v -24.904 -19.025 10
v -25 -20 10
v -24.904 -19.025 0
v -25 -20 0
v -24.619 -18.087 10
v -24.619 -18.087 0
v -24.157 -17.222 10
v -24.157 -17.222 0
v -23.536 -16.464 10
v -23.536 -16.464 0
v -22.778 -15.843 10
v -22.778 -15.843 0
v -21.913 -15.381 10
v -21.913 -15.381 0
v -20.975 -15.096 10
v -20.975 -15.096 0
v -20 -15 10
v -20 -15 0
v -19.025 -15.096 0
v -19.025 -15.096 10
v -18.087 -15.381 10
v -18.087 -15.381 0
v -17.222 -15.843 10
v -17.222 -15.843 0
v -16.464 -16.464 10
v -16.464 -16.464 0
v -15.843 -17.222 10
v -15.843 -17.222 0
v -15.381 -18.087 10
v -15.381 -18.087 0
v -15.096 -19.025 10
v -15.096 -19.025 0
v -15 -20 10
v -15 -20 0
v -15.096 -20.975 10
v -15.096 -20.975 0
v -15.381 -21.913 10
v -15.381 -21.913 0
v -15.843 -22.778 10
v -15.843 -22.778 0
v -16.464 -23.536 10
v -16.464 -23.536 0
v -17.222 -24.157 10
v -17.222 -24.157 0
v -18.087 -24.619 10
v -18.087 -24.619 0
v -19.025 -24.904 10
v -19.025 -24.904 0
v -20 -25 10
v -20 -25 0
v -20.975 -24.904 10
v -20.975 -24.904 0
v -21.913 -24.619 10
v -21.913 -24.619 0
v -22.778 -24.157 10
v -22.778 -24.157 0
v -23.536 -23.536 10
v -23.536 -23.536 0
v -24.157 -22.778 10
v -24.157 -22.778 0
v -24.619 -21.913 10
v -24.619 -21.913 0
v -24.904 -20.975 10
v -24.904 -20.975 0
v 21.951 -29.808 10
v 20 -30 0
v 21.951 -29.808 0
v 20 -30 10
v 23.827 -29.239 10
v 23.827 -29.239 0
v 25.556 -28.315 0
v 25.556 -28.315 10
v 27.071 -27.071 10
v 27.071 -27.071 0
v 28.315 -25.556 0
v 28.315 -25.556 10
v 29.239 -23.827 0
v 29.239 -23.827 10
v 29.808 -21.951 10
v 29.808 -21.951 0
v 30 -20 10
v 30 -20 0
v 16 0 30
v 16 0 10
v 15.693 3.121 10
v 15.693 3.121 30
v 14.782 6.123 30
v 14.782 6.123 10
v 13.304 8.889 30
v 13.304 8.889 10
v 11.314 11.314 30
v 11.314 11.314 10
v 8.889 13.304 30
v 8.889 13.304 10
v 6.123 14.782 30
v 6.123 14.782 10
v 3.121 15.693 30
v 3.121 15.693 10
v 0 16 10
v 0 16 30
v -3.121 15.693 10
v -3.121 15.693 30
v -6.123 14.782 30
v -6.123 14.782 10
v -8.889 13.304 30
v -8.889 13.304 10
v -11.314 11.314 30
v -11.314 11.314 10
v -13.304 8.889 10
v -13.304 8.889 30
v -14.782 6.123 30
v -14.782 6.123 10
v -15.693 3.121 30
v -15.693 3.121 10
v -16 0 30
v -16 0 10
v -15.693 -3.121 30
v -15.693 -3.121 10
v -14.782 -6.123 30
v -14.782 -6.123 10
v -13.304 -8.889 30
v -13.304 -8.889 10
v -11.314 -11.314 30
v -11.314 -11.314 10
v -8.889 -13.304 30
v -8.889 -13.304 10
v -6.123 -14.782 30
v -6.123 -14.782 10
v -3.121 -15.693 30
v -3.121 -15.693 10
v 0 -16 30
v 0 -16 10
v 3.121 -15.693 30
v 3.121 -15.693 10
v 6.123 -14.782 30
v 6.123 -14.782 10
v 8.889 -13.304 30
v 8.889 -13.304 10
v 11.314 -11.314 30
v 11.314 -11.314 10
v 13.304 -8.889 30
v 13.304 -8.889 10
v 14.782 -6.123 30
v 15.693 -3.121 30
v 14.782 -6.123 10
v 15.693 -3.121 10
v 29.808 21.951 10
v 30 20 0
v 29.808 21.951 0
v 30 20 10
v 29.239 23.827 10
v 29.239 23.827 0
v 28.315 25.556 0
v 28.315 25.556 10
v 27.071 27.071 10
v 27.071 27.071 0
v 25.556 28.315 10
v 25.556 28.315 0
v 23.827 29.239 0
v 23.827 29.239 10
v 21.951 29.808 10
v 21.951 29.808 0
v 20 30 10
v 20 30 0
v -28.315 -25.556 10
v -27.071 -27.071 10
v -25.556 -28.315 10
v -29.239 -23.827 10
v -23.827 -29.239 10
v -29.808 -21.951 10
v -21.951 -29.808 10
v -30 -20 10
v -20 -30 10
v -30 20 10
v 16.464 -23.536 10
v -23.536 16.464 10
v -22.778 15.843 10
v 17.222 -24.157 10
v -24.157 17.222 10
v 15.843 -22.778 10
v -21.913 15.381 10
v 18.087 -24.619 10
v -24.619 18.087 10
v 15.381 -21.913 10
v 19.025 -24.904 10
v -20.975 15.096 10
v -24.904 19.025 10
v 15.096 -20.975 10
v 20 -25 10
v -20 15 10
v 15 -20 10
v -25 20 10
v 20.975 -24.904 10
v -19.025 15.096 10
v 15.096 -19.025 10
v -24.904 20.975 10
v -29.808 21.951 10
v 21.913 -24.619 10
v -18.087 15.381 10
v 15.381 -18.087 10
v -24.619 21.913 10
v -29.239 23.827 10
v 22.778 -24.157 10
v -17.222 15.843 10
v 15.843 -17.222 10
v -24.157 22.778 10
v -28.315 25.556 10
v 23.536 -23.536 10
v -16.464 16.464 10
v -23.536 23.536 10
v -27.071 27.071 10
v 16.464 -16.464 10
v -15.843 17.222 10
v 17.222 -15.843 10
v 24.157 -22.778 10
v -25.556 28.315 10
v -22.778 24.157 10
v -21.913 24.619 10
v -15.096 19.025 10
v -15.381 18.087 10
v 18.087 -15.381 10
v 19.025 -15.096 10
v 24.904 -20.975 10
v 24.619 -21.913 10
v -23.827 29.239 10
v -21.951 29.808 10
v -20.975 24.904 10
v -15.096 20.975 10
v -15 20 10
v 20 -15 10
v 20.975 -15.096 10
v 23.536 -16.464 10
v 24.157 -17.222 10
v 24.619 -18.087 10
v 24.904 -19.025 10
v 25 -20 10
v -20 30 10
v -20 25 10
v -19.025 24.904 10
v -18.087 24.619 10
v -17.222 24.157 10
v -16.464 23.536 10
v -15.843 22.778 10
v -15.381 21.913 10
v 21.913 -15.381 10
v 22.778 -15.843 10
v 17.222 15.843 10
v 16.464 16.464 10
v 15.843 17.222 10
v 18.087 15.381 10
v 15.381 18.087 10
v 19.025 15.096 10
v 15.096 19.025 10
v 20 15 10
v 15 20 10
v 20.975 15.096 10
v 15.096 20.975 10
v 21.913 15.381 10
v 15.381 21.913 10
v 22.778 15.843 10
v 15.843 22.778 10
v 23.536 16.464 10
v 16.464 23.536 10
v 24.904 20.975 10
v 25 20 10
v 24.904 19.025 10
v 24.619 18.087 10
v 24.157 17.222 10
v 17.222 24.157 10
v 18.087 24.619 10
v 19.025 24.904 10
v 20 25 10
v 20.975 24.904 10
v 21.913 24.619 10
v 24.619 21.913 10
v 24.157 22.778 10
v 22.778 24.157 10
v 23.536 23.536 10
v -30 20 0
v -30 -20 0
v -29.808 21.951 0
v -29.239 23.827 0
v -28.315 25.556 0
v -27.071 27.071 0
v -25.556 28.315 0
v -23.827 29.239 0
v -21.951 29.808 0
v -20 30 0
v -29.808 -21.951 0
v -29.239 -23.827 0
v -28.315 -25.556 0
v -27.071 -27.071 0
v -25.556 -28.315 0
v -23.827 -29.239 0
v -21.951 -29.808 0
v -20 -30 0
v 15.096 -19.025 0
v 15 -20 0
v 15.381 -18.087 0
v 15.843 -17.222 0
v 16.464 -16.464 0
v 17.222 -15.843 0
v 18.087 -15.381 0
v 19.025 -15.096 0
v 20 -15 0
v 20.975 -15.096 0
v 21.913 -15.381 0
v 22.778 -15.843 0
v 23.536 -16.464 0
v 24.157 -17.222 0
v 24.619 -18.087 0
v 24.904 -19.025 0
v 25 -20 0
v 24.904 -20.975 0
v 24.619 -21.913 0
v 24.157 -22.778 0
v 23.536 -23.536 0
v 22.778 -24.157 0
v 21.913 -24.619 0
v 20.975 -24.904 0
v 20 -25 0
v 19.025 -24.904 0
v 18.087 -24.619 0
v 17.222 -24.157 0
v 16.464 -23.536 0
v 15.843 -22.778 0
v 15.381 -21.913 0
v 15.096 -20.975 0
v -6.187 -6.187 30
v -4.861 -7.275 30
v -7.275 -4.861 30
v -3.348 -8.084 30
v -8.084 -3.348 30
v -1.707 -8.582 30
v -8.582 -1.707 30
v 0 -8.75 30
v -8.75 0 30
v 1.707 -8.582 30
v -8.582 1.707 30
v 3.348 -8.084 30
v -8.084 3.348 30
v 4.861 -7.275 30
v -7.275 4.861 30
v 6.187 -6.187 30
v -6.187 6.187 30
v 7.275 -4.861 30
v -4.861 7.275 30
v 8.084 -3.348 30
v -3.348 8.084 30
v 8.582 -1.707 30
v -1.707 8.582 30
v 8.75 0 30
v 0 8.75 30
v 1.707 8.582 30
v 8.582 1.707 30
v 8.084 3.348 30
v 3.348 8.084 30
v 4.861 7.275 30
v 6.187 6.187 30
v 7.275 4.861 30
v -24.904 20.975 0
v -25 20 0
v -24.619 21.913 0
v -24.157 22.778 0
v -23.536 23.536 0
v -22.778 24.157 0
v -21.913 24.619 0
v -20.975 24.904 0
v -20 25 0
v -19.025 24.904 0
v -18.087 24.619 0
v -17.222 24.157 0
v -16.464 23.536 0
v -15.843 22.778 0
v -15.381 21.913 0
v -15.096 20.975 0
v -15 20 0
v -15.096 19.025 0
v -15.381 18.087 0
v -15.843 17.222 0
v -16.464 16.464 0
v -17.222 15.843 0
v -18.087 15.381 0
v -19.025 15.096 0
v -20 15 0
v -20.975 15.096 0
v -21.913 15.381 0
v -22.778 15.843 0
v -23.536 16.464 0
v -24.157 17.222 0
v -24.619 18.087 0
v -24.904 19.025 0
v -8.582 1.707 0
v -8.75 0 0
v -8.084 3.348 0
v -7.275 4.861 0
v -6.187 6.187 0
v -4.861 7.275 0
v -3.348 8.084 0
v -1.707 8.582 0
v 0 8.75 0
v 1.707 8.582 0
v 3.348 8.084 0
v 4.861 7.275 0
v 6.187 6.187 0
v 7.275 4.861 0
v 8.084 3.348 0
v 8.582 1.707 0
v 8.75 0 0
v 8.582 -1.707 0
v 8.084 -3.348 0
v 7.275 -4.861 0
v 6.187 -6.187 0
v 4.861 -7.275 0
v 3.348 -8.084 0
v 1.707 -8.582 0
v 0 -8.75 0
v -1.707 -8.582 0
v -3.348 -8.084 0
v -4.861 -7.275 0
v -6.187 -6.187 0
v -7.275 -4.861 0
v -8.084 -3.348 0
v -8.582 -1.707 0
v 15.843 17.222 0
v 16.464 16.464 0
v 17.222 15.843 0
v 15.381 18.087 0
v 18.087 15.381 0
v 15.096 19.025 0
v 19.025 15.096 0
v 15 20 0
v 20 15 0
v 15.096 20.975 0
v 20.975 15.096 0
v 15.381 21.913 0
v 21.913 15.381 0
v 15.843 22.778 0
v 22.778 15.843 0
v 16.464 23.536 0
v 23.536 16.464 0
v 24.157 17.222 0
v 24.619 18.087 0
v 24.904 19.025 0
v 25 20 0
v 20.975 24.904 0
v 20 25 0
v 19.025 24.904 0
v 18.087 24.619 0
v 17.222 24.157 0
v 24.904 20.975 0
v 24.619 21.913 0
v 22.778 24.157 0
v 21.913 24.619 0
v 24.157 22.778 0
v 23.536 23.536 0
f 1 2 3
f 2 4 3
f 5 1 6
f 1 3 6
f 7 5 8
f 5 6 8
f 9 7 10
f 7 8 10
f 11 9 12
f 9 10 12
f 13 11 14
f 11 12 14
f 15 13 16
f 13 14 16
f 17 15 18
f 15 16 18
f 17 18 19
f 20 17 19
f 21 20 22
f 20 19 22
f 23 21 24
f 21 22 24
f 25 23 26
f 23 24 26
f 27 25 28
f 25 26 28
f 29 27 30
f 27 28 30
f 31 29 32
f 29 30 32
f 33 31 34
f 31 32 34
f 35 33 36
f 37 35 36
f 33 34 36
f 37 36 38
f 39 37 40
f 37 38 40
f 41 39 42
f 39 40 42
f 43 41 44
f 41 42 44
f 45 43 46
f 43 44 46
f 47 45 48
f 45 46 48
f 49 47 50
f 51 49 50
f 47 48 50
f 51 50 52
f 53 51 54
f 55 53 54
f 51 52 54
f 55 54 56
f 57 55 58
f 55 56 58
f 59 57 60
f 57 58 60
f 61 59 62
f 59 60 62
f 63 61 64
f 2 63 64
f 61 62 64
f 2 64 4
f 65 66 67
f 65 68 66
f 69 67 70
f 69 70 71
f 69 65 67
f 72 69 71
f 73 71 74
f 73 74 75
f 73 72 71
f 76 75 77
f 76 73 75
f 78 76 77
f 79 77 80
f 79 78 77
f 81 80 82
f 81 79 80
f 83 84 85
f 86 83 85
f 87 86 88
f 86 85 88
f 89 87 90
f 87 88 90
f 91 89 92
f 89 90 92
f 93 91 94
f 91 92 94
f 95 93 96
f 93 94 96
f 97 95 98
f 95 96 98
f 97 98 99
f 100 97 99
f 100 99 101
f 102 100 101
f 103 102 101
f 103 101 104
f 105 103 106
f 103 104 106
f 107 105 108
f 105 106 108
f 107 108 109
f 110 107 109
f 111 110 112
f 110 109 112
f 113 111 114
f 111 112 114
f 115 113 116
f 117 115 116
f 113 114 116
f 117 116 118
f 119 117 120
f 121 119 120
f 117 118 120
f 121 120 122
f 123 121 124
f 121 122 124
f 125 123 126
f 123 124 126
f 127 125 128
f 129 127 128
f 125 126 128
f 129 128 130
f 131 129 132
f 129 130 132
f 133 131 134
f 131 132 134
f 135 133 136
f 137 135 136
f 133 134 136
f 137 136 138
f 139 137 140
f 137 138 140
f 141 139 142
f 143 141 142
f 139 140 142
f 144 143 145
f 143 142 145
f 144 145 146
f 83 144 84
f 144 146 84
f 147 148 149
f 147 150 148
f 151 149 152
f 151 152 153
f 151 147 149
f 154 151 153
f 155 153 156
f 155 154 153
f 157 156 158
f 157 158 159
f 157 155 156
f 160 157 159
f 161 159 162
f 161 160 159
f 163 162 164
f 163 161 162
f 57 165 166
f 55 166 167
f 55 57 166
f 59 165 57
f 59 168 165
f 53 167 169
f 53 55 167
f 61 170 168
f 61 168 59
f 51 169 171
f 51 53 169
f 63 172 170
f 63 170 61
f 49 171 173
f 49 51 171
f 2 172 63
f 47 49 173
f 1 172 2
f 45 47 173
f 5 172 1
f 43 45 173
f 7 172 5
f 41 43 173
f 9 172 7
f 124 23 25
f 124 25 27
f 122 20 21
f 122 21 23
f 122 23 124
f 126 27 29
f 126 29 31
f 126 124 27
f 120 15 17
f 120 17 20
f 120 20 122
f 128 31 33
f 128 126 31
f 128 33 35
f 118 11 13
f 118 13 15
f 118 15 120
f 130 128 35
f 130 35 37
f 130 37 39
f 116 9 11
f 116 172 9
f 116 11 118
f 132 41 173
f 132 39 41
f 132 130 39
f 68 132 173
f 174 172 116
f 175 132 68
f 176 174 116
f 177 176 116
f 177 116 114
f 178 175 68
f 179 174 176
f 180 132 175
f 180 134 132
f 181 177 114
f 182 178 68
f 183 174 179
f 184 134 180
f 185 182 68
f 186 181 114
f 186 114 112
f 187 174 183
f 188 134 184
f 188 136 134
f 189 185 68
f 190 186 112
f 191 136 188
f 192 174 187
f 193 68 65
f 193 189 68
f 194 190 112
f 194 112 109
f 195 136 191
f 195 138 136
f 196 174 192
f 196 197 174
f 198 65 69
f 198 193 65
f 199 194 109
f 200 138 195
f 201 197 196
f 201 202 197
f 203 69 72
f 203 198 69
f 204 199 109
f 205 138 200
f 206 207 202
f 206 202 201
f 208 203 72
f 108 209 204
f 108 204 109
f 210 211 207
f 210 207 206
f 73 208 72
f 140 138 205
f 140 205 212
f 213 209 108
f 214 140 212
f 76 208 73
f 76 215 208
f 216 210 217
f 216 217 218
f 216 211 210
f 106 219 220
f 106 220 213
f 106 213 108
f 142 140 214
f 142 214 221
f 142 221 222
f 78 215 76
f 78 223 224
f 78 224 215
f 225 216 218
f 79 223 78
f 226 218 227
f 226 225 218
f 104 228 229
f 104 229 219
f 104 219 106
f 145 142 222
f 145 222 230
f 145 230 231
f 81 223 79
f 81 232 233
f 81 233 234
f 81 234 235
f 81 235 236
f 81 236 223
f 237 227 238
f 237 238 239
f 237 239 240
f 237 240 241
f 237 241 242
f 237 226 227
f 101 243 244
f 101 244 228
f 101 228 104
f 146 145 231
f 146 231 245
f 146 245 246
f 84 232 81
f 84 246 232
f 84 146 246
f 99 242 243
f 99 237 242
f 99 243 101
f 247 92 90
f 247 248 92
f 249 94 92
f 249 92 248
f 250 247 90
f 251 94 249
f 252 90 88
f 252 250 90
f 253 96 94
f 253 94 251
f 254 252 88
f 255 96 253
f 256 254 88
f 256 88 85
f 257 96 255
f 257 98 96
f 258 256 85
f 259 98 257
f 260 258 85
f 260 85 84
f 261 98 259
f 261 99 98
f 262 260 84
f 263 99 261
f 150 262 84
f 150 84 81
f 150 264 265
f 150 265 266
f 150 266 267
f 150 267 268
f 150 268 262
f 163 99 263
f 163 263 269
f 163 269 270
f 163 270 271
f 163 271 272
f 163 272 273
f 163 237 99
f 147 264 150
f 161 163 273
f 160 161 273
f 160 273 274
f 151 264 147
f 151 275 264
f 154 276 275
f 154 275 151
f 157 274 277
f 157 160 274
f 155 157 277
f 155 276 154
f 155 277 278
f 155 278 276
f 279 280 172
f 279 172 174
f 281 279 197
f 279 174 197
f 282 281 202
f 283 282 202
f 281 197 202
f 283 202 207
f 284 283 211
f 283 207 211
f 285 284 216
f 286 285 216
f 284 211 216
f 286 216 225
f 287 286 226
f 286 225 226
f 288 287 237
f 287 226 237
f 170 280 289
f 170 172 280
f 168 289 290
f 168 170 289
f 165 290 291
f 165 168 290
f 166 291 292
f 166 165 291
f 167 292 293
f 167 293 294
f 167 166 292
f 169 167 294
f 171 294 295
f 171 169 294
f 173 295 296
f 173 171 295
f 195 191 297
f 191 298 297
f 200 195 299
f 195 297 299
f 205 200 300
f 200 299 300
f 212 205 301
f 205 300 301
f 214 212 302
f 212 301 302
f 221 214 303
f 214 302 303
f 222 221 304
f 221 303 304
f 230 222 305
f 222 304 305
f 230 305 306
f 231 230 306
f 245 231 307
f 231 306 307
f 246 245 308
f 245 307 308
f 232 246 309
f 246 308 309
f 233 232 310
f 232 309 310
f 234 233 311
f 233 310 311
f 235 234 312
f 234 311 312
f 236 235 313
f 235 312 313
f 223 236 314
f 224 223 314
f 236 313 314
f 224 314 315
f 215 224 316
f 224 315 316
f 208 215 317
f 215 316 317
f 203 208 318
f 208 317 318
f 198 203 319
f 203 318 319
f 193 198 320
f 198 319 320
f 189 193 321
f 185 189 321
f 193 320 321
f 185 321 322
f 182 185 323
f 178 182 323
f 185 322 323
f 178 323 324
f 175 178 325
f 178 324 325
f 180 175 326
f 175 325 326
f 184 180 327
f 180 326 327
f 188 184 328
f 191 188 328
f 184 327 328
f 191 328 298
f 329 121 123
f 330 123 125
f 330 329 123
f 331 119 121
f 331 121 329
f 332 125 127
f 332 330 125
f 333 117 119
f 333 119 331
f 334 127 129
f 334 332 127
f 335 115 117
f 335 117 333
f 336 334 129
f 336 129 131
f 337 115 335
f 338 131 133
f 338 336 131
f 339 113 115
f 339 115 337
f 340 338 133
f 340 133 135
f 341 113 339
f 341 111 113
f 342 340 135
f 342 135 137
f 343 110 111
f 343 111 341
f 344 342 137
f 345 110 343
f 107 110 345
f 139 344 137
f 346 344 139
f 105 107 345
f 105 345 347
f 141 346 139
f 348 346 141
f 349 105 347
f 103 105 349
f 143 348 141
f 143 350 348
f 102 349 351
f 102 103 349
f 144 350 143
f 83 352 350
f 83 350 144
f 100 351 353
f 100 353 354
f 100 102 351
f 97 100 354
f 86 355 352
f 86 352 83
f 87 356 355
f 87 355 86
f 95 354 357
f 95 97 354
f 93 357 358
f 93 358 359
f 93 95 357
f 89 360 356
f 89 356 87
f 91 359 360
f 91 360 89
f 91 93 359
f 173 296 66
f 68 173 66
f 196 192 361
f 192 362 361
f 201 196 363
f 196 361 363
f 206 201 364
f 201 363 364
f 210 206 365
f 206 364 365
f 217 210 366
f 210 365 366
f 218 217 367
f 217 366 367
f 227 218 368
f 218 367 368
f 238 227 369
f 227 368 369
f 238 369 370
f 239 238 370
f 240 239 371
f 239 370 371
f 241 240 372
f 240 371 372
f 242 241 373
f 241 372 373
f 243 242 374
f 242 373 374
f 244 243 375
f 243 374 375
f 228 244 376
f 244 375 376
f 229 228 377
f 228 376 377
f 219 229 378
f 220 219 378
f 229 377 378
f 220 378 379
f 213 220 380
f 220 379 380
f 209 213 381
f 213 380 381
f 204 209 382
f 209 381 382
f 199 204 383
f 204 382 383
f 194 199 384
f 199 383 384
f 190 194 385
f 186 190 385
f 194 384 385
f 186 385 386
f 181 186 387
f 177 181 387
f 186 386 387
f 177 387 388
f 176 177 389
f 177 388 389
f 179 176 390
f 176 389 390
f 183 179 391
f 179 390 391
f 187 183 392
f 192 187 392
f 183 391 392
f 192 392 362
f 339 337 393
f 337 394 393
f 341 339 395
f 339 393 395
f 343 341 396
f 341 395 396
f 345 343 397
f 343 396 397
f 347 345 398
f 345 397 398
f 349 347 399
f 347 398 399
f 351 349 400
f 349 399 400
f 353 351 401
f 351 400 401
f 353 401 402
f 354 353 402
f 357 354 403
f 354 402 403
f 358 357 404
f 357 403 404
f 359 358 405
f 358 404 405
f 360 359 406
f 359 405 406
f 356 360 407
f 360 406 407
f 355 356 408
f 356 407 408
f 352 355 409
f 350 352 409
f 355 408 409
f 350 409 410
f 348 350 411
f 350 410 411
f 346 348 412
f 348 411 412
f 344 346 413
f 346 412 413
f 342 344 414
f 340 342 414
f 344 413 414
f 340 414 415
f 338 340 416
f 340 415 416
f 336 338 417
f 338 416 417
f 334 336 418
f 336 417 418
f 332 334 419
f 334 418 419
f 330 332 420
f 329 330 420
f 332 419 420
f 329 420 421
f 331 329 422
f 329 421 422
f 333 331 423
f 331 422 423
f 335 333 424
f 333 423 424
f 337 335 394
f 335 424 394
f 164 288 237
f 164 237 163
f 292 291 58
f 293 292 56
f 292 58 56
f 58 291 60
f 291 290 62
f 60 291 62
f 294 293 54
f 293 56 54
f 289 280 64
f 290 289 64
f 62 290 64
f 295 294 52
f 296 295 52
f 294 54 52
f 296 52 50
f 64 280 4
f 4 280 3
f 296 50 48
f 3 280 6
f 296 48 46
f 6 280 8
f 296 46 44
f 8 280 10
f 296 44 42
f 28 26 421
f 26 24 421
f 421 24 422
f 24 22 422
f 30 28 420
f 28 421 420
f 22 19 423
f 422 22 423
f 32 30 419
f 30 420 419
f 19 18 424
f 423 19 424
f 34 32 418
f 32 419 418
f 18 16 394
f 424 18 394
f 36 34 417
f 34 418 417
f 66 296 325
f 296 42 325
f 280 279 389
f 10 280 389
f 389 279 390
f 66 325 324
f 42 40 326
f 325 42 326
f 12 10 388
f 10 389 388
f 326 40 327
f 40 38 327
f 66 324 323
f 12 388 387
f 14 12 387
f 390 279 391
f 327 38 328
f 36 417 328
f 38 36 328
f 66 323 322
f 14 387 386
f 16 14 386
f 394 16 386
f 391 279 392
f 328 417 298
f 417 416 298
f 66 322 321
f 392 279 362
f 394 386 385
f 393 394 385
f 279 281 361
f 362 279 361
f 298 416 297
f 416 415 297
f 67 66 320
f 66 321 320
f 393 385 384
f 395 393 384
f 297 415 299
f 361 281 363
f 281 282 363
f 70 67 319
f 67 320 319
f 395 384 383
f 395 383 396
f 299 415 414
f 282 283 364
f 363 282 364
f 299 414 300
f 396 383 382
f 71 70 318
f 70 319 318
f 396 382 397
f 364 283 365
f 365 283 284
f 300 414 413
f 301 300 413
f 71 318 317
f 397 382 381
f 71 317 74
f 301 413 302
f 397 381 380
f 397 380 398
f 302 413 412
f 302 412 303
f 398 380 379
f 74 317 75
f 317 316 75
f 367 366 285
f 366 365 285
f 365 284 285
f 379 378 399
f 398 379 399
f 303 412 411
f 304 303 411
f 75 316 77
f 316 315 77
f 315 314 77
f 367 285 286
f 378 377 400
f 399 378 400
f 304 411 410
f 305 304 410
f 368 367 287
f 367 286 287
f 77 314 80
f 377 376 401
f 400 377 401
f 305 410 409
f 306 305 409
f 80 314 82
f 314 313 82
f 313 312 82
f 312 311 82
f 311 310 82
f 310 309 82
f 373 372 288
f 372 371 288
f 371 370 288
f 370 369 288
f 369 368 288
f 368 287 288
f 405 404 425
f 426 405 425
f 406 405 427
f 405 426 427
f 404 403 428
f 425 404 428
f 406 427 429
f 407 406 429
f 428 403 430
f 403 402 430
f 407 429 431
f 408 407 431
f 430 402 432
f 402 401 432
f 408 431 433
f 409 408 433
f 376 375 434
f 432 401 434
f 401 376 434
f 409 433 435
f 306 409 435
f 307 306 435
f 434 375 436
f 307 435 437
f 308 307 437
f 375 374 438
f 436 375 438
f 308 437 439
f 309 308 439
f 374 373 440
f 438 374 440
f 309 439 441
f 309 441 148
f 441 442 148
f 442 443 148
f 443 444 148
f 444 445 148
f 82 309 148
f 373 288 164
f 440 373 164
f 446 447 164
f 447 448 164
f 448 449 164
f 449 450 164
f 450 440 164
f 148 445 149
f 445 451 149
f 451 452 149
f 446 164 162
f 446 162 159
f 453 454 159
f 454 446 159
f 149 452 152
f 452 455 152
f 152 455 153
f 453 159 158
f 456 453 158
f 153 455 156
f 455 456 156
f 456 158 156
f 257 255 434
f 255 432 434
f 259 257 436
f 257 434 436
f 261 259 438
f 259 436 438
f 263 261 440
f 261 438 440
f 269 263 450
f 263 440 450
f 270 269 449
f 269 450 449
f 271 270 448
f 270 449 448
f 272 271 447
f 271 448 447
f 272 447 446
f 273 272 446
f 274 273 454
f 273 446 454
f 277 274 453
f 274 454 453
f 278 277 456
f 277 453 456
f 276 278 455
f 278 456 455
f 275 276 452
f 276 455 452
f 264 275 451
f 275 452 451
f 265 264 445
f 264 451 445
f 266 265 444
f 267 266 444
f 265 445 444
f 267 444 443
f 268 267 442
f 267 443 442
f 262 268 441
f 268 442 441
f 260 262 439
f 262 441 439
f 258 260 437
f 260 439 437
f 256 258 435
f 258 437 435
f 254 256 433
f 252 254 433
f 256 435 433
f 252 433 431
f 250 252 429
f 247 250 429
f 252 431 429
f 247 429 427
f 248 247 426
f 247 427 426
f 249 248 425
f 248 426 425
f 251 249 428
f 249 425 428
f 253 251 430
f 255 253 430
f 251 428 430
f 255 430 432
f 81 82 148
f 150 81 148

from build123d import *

# Parameters (mm, degrees)
F0_W     = 60
F0_H     = 60
F1_DEPTH = 10
F2_R     = 10
F4_D     = 10
F4_DEPTH = 10
F4_TIP   = 3.0043030951
F5_R     = 16
F6_DEPTH = 20
F8_D     = 17.5
F8_DEPTH = 30
F8_TIP   = 5.2575304165


with BuildPart() as f1:
    # F0 (on Top) → F1 (new body)
    with BuildSketch(Plane.XY):
        Rectangle(F0_W, F0_H)
    extrude(amount=F1_DEPTH)

    # F2
    f2_edges = [f1.edges().sort_by_distance(p)[0] for p in [
        (-30, 30, 5),
        (-30, -30, 5),
        (30, -30, 5),
        (30, 30, 5),
    ]]
    fillet(f2_edges, radius=F2_R)

    # F4
    with Locations(Plane.XY.offset(10)):
        with Locations((-20, 20), (20, 20), (20, -20), (-20, -20)):
            Hole(F4_D / 2, depth=F4_DEPTH)
            with Locations((0, 0, -(F4_DEPTH + F4_TIP / 2))):  # 118° drill point
                Cone(0, F4_D / 2, F4_TIP, mode=Mode.SUBTRACT)

    # F5 (on face) → F6 (join)
    with BuildSketch(Plane.XY.offset(10)):
        Circle(F5_R)
    extrude(amount=F6_DEPTH)

    # F8
    with Locations(Plane.XY.offset(30)):
        with Locations((0, 0)):
            Hole(F8_D / 2, depth=F8_DEPTH)
            with Locations((0, 0, -(F8_DEPTH + F8_TIP / 2))):  # 118° drill point
                Cone(0, F8_D / 2, F8_TIP, mode=Mode.SUBTRACT)


solid = f1.part
